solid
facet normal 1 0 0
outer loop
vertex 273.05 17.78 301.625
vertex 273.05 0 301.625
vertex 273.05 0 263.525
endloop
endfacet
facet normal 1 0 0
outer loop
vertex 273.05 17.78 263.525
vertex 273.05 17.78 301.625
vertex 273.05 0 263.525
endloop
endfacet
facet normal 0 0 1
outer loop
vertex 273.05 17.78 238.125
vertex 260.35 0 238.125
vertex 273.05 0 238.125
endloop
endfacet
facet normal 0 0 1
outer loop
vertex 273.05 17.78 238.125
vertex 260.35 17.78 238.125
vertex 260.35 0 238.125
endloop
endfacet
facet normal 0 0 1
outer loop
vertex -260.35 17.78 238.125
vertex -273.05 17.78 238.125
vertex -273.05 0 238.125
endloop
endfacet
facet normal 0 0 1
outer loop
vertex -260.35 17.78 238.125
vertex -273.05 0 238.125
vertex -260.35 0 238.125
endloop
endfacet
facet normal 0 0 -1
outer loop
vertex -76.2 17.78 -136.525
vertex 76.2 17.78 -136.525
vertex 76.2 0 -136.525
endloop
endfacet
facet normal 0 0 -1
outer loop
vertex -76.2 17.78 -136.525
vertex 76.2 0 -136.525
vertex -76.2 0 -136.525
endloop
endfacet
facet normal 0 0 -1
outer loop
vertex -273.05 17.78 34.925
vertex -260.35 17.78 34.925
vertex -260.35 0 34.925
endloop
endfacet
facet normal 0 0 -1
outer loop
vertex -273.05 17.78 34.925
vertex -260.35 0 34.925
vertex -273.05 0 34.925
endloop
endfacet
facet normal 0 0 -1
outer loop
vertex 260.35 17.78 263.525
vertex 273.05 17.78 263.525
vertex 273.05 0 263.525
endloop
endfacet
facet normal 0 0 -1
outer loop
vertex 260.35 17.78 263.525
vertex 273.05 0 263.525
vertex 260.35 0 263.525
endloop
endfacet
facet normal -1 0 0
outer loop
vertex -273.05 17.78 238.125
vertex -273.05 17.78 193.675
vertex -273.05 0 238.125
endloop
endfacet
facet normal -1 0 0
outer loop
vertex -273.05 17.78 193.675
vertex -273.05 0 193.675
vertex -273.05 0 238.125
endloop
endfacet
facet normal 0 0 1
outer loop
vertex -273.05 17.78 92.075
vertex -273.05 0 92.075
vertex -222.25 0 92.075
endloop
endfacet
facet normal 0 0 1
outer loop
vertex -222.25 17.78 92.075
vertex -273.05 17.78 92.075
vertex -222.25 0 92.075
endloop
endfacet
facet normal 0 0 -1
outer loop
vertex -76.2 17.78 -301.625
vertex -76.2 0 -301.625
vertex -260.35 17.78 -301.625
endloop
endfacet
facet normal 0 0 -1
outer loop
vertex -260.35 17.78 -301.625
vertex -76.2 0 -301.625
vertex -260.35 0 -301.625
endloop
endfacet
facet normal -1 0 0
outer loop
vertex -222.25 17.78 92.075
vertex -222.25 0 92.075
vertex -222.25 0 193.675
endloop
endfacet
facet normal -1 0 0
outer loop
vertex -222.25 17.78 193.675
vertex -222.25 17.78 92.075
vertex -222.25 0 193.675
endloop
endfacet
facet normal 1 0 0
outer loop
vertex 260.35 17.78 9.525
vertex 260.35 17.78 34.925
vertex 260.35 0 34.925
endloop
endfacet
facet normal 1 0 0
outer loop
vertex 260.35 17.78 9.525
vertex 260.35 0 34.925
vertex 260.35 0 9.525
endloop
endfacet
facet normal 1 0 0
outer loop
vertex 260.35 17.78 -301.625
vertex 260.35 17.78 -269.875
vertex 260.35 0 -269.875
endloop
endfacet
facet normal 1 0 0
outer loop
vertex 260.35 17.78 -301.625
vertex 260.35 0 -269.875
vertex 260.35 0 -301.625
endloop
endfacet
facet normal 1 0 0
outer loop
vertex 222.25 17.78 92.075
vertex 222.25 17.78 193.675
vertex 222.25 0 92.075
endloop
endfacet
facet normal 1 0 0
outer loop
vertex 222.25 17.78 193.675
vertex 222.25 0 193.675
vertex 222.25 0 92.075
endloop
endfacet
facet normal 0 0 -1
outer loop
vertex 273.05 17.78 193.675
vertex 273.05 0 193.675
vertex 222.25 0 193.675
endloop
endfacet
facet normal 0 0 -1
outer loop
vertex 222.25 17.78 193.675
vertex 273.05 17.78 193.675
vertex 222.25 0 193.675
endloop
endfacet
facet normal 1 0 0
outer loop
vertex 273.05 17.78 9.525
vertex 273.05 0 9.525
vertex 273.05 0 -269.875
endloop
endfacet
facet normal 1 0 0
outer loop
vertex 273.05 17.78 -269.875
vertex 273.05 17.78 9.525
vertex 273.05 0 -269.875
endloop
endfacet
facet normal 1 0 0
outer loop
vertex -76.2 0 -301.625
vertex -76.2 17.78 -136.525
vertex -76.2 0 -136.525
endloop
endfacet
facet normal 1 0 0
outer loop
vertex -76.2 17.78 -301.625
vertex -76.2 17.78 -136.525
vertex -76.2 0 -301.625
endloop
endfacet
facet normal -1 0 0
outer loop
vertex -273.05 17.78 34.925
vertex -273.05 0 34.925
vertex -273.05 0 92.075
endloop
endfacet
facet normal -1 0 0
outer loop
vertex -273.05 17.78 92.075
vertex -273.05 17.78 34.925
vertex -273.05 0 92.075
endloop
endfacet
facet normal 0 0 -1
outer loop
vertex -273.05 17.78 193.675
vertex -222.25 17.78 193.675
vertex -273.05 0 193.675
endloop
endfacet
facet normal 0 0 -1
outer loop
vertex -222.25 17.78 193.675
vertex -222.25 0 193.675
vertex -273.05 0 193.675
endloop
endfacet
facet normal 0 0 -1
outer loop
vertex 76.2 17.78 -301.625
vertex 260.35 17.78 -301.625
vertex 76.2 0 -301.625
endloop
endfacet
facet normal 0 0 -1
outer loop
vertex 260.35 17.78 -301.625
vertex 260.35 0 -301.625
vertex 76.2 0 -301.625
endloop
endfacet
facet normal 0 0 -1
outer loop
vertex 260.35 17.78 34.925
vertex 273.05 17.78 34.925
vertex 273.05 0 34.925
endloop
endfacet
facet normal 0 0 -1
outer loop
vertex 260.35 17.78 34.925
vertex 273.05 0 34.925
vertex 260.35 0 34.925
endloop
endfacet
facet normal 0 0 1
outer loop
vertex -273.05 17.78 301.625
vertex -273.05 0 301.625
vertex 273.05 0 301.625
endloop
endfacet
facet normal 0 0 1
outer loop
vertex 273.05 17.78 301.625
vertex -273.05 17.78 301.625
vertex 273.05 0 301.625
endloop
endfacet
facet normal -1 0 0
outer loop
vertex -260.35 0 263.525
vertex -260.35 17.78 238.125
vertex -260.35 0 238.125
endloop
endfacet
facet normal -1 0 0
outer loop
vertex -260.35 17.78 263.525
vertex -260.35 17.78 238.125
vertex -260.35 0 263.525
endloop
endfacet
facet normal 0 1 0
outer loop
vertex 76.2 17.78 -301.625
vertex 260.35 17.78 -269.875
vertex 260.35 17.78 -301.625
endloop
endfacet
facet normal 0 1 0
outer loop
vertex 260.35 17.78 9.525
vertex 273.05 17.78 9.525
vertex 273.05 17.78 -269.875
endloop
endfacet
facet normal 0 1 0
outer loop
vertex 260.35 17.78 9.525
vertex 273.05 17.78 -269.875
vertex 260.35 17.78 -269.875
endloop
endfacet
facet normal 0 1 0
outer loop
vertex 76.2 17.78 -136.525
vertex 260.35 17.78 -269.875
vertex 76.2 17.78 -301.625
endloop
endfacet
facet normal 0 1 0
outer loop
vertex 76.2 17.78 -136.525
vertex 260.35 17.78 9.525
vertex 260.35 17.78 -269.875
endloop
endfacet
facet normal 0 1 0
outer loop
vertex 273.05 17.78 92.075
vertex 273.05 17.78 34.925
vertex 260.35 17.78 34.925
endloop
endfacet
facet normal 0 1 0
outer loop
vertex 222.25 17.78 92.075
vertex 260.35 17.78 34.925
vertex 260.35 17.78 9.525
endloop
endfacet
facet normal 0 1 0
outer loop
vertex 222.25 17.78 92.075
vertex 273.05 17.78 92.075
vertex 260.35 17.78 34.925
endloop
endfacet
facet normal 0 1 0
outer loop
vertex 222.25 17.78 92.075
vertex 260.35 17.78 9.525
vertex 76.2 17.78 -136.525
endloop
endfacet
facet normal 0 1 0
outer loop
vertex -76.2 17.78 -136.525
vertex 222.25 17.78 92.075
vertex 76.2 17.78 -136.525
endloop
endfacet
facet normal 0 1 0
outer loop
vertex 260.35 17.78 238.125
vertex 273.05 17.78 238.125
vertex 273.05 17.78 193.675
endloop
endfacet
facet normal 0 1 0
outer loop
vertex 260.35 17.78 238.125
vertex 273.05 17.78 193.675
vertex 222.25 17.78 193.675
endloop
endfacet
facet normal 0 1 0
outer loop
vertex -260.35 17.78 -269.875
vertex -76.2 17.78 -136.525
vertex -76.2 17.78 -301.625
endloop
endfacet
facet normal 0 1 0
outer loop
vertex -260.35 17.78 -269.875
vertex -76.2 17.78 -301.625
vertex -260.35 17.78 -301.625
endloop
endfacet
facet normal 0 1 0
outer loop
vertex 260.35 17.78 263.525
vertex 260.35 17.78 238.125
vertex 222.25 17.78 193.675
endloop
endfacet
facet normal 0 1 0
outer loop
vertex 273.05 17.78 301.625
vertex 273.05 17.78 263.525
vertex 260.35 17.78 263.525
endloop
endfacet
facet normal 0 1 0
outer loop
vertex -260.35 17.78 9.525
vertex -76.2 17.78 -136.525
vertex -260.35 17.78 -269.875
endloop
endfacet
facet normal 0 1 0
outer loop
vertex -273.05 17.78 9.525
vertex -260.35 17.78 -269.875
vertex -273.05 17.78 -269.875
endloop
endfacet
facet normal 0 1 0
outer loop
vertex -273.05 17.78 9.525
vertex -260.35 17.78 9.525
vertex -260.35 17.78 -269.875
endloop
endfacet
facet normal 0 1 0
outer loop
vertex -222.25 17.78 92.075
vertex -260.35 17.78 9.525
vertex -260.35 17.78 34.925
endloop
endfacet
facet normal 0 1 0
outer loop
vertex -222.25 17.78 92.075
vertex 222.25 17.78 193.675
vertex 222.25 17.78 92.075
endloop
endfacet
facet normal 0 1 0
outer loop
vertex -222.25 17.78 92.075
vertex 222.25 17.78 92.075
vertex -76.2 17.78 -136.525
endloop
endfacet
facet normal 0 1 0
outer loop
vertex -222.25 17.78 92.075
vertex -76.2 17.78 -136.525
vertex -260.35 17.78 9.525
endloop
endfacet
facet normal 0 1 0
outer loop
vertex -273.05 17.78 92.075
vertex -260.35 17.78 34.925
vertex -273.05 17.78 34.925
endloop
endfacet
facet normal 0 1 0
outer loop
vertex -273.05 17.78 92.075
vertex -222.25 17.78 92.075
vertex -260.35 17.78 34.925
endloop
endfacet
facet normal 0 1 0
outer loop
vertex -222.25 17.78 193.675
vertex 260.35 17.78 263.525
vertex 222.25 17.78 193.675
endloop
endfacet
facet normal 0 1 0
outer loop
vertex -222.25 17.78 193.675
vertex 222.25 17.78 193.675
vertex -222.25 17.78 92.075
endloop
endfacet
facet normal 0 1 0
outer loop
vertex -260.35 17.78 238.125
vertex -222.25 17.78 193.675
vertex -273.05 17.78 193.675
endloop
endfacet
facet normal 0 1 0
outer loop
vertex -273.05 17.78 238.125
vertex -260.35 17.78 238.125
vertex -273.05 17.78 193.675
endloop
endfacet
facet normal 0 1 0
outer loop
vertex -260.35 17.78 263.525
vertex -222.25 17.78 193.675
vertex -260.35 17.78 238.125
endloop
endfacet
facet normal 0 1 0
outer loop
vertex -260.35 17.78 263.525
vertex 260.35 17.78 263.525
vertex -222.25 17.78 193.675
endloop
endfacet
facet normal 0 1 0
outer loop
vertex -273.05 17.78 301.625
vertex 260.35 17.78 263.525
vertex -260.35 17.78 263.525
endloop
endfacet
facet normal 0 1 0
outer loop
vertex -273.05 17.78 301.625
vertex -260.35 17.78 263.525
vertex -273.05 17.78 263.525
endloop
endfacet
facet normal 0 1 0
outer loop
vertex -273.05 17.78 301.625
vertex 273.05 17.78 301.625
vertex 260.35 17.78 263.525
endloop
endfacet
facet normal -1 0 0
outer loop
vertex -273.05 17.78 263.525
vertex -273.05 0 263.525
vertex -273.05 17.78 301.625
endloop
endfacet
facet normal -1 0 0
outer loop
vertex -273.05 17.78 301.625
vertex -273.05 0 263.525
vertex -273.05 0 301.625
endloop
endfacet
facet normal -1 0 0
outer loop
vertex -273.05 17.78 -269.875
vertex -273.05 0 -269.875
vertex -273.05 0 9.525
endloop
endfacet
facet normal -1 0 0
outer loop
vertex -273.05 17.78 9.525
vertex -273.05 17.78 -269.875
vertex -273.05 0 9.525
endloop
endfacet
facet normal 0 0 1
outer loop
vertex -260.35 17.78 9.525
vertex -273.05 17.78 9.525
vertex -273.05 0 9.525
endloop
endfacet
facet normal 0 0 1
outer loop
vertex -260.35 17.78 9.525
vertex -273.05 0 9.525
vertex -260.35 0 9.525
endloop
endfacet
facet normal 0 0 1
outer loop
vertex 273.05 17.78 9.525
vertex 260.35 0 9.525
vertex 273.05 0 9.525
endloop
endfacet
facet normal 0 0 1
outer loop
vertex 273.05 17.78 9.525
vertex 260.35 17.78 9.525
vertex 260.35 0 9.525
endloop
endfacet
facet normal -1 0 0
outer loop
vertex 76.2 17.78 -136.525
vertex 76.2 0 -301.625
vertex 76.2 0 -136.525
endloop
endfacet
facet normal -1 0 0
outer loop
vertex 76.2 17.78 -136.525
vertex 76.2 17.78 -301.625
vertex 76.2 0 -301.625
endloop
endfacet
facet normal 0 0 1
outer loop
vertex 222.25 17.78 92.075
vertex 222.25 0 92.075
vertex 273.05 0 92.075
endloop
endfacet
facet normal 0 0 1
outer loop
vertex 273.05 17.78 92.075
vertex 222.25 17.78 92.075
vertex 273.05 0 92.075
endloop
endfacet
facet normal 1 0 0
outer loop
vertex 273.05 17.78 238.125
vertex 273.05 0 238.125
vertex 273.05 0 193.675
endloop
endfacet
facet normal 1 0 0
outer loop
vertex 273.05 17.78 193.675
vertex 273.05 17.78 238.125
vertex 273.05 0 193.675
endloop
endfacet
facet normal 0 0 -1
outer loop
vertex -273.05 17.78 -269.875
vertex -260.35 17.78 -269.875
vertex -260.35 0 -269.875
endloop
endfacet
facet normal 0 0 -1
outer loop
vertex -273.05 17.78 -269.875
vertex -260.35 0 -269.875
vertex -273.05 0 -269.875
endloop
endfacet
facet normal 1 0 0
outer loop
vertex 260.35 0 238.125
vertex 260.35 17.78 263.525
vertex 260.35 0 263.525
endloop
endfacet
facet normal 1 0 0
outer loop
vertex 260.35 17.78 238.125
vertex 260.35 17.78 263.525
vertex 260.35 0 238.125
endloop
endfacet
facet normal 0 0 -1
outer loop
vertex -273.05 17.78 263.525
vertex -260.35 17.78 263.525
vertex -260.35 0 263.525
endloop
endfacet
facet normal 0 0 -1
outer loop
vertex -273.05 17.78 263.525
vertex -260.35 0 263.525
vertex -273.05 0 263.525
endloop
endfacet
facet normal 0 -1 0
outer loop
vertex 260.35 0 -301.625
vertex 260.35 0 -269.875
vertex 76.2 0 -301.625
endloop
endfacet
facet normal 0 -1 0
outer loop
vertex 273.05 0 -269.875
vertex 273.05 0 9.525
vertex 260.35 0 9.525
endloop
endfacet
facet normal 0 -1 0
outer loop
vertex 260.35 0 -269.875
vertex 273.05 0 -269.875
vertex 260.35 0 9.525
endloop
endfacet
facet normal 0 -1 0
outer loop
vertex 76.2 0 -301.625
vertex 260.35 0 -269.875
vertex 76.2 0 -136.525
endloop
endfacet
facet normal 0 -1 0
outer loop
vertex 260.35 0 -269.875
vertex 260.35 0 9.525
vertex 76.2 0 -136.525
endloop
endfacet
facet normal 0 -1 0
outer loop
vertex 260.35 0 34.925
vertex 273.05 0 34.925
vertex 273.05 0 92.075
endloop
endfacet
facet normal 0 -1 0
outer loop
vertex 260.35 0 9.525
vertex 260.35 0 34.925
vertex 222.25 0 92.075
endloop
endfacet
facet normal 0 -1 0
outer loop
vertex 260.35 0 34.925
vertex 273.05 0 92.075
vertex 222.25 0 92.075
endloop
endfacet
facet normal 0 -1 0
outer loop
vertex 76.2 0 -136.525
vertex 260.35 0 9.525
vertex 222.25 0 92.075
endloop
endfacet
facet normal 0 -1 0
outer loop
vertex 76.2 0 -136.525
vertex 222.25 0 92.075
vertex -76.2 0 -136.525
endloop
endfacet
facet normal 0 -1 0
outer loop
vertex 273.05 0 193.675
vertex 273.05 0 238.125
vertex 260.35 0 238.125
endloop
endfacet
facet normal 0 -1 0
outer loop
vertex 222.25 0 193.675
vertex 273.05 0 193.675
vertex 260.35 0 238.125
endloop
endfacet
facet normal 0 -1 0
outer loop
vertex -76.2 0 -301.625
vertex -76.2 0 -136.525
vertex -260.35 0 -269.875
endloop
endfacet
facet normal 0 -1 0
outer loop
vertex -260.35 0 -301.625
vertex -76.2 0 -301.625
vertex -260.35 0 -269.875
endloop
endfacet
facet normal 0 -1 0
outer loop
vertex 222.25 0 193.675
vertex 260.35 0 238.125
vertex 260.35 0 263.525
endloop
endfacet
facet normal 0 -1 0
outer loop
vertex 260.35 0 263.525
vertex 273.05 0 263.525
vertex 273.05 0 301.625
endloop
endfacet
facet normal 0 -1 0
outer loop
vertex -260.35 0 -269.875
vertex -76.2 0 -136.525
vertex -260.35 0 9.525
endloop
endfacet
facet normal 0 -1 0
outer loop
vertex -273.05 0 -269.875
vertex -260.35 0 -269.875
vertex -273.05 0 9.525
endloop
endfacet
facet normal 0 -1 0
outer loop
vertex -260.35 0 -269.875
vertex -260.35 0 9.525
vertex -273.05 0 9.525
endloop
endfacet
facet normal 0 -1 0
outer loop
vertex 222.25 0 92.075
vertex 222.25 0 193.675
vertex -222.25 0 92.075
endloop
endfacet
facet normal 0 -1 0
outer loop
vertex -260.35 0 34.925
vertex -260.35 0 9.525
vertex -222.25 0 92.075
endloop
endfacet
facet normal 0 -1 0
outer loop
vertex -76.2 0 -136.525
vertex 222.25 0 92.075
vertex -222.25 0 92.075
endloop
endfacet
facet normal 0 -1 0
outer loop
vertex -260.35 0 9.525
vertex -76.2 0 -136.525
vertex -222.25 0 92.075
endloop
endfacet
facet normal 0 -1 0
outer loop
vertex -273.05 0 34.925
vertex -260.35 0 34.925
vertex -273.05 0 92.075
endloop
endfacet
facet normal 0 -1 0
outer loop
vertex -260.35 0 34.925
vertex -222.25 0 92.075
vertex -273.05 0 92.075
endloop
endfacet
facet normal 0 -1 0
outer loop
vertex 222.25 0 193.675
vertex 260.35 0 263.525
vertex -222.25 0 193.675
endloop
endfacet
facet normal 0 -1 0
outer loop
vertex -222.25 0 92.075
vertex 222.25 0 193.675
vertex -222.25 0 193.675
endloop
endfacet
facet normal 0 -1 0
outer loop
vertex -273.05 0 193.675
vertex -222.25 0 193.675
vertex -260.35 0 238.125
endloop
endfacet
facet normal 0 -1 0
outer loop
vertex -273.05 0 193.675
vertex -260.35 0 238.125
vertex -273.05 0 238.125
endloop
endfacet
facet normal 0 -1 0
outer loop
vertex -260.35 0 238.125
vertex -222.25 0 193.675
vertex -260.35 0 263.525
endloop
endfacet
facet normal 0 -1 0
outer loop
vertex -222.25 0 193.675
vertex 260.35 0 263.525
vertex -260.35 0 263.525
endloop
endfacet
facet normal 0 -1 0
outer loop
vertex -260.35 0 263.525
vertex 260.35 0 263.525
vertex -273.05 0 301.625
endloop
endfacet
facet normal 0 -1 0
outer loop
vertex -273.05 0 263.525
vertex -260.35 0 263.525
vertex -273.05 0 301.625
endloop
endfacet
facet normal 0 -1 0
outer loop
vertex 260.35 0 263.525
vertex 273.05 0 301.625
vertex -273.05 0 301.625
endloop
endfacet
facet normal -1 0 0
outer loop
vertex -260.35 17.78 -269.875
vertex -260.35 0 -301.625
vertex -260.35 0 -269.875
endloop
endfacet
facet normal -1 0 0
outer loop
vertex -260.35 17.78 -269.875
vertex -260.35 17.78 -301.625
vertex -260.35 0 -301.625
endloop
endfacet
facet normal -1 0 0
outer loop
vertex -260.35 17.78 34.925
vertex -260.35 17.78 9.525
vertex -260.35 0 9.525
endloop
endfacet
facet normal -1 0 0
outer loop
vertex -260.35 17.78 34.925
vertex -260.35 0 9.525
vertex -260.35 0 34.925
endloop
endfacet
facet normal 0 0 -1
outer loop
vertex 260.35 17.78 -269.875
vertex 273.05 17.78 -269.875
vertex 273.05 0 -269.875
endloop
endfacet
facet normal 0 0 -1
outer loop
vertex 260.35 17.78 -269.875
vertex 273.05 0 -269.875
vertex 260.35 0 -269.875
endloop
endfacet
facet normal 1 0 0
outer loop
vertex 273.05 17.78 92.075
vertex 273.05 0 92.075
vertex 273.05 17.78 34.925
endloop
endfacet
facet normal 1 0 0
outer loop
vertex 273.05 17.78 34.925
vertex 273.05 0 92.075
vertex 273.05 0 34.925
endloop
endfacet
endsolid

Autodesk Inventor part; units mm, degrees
ref_plane "XZ Plane" through (0, 0, 0) normal (0, 1, 0) x (-1, 0, 0)
ref_plane "XY Plane" through (0, 0, 0) normal (0, 0, 1) x (1, 0, 0)
sketch "Sketch1" plane through (0, 0, 0) normal (0, 1, 0) x (-1, 0, 0)
  line L0 (-273.05, 301.625) -> (-273.05, -301.625)
  line L1 (-273.05, -301.625) -> (273.05, -301.625)
  line L2 (273.05, -301.625) -> (273.05, 301.625)
  line L3 (273.05, 301.625) -> (-273.05, 301.625)
  line L4 (-273.05, 301.625) -> (273.05, -301.625) construction
  line L5 (-273.05, -301.625) -> (273.05, 301.625) construction
  point P0 (0, 0)
  dimension "baseLength" = 603.25
  dimension "baseWidth" = 546.1
extrude "Extrusion1" add sketch "Sketch1" along normal blind 17.78
sketch "Sketch2" plane through (0, 0, 0) normal (0, -1, 0) x (1, 0, 0)
  line L0 (273.05, 301.625) -> (273.05, -301.625) projected
  line L1 (273.05, 193.675) -> (222.25, 193.675)
  line L2 (222.25, 193.675) -> (222.25, 92.075)
  line L3 (222.25, 92.075) -> (273.05, 92.075)
  line L4 (273.05, 92.075) -> (273.05, 193.675)
  line L5 (-273.05, 301.625) -> (273.05, 301.625) projected
  point P0 (0, 0)
  dimension "backToEndOfGearBox" = 107.95
  dimension "backToFrontOfGearBox" = 209.55
  dimension "wdithForGearBox" = 50.8
extrude "Extrusion2" cut sketch "Sketch2" against normal through all
mirror "Mirror1" about plane through (0, 0, 0) normal (1, 0, 0) of "Extrusion2"
sketch "Sketch3" plane through (0, 17.78, 0) normal (0, 1, 0) x (1, 0, 0)
  line L0 (273.05, -263.525) -> (260.35, -263.525)
  line L1 (260.35, -263.525) -> (260.35, -238.125)
  line L2 (260.35, -238.125) -> (273.05, -238.125)
  line L3 (273.05, -238.125) -> (273.05, -263.525)
  line L4 (273.05, -301.625) -> (273.05, -193.675) projected
  line L5 (-273.05, -301.625) -> (273.05, -301.625) projected
  point P0 (0, 0)
  dimension "d9" = 25.4
  dimension "d10" = 12.7
  dimension "d11" = 38.1
extrude "Extrusion3" cut sketch "Sketch3" against normal through all
mirror "Mirror2" about plane through (0, 0, 0) normal (1, 0, 0) of "Extrusion3"
sketch "Sketch4" plane through (0, 17.78, 0) normal (0, 1, 0) x (1, 0, 0)
  line L0 (273.05, -92.075) -> (273.05, 301.625) projected
  line L1 (273.05, -34.925) -> (260.35, -34.925)
  line L2 (260.35, -34.925) -> (260.35, -9.525)
  line L3 (260.35, -9.525) -> (273.05, -9.525)
  line L4 (273.05, -9.525) -> (273.05, -34.925)
  line L5 (-273.05, -301.625) -> (273.05, -301.625) projected
  point P0 (0, 0)
  dimension "d14" = 25.4
  dimension "d15" = 266.7
  dimension "d16" = 12.7
extrude "Extrusion4" cut sketch "Sketch4" against normal through all
mirror "Mirror3" about plane through (0, 0, 0) normal (1, 0, 0) of "Extrusion4"
sketch "Sketch5" plane through (0, 17.78, 0) normal (0, 1, 0) x (1, 0, 0)
  line L0 (273.05, 269.875) -> (260.35, 269.875)
  line L1 (260.35, 269.875) -> (260.35, 301.625)
  line L2 (260.35, 301.625) -> (273.05, 301.625)
  line L3 (273.05, 301.625) -> (273.05, 269.875)
  line L4 (273.05, -9.525) -> (273.05, 301.625) projected
  line L5 (273.05, 301.625) -> (-273.05, 301.625) projected
  point P0 (0, 0)
  dimension "d19" = 12.7
  dimension "d20" = 31.75
extrude "Extrusion5" cut sketch "Sketch5" against normal through all
mirror "Mirror4" about plane through (0, 0, 0) normal (1, 0, 0) of "Extrusion5"
sketch "Sketch8" plane through (0, 17.78, 0) normal (0, 1, 0) x (1, 0, 0)
  line L0 (-76.2, 301.625) -> (76.2, 301.625)
  line L1 (76.2, 301.625) -> (76.2, 136.525)
  line L2 (76.2, 136.525) -> (-76.2, 136.525)
  line L3 (-76.2, 136.525) -> (-76.2, 301.625)
  line L4 (260.35, 301.625) -> (-260.35, 301.625) projected
  point P0 (0, 0)
  dimension "d23" = 76.2
  dimension "d24" = 76.2
  dimension "d25" = 165.1
extrude "Extrusion6" cut sketch "Sketch8" against normal through all
equation "\"baseLength\" = userBaseLength"
equation "\"baseWidth\" = userBaseWidth"
equation "\"d9\" = lengthOfSpacingForBolt"
equation "\"d10\" = widthOfSpacingForBolt"
equation "\"d11\" = distanceFromBackForEndBolt"
equation "\"d14\" = lengthOfSpacingForBolt"
equation "\"d16\" = widthOfSpacingForBolt"
equation "\"d19\" = widthOfSpacingForBolt"
equation "\"spaceingAlongSides\" = 3.175"
equation "\"distanceFromBackForEndBolt\" = 38.1"
equation "\"widthOfSpacingForBolt\" = 12.7"
equation "\"lengthOfSpacingForBolt\" = 25.4"
equation "\"userBaseLength\" = 603.25"
equation "\"userBaseWidth\" = 546.1"
properties part number "RhinoBottomFloorPlate01-ExtendedBy3Inches" material "Wood (Birch)"
